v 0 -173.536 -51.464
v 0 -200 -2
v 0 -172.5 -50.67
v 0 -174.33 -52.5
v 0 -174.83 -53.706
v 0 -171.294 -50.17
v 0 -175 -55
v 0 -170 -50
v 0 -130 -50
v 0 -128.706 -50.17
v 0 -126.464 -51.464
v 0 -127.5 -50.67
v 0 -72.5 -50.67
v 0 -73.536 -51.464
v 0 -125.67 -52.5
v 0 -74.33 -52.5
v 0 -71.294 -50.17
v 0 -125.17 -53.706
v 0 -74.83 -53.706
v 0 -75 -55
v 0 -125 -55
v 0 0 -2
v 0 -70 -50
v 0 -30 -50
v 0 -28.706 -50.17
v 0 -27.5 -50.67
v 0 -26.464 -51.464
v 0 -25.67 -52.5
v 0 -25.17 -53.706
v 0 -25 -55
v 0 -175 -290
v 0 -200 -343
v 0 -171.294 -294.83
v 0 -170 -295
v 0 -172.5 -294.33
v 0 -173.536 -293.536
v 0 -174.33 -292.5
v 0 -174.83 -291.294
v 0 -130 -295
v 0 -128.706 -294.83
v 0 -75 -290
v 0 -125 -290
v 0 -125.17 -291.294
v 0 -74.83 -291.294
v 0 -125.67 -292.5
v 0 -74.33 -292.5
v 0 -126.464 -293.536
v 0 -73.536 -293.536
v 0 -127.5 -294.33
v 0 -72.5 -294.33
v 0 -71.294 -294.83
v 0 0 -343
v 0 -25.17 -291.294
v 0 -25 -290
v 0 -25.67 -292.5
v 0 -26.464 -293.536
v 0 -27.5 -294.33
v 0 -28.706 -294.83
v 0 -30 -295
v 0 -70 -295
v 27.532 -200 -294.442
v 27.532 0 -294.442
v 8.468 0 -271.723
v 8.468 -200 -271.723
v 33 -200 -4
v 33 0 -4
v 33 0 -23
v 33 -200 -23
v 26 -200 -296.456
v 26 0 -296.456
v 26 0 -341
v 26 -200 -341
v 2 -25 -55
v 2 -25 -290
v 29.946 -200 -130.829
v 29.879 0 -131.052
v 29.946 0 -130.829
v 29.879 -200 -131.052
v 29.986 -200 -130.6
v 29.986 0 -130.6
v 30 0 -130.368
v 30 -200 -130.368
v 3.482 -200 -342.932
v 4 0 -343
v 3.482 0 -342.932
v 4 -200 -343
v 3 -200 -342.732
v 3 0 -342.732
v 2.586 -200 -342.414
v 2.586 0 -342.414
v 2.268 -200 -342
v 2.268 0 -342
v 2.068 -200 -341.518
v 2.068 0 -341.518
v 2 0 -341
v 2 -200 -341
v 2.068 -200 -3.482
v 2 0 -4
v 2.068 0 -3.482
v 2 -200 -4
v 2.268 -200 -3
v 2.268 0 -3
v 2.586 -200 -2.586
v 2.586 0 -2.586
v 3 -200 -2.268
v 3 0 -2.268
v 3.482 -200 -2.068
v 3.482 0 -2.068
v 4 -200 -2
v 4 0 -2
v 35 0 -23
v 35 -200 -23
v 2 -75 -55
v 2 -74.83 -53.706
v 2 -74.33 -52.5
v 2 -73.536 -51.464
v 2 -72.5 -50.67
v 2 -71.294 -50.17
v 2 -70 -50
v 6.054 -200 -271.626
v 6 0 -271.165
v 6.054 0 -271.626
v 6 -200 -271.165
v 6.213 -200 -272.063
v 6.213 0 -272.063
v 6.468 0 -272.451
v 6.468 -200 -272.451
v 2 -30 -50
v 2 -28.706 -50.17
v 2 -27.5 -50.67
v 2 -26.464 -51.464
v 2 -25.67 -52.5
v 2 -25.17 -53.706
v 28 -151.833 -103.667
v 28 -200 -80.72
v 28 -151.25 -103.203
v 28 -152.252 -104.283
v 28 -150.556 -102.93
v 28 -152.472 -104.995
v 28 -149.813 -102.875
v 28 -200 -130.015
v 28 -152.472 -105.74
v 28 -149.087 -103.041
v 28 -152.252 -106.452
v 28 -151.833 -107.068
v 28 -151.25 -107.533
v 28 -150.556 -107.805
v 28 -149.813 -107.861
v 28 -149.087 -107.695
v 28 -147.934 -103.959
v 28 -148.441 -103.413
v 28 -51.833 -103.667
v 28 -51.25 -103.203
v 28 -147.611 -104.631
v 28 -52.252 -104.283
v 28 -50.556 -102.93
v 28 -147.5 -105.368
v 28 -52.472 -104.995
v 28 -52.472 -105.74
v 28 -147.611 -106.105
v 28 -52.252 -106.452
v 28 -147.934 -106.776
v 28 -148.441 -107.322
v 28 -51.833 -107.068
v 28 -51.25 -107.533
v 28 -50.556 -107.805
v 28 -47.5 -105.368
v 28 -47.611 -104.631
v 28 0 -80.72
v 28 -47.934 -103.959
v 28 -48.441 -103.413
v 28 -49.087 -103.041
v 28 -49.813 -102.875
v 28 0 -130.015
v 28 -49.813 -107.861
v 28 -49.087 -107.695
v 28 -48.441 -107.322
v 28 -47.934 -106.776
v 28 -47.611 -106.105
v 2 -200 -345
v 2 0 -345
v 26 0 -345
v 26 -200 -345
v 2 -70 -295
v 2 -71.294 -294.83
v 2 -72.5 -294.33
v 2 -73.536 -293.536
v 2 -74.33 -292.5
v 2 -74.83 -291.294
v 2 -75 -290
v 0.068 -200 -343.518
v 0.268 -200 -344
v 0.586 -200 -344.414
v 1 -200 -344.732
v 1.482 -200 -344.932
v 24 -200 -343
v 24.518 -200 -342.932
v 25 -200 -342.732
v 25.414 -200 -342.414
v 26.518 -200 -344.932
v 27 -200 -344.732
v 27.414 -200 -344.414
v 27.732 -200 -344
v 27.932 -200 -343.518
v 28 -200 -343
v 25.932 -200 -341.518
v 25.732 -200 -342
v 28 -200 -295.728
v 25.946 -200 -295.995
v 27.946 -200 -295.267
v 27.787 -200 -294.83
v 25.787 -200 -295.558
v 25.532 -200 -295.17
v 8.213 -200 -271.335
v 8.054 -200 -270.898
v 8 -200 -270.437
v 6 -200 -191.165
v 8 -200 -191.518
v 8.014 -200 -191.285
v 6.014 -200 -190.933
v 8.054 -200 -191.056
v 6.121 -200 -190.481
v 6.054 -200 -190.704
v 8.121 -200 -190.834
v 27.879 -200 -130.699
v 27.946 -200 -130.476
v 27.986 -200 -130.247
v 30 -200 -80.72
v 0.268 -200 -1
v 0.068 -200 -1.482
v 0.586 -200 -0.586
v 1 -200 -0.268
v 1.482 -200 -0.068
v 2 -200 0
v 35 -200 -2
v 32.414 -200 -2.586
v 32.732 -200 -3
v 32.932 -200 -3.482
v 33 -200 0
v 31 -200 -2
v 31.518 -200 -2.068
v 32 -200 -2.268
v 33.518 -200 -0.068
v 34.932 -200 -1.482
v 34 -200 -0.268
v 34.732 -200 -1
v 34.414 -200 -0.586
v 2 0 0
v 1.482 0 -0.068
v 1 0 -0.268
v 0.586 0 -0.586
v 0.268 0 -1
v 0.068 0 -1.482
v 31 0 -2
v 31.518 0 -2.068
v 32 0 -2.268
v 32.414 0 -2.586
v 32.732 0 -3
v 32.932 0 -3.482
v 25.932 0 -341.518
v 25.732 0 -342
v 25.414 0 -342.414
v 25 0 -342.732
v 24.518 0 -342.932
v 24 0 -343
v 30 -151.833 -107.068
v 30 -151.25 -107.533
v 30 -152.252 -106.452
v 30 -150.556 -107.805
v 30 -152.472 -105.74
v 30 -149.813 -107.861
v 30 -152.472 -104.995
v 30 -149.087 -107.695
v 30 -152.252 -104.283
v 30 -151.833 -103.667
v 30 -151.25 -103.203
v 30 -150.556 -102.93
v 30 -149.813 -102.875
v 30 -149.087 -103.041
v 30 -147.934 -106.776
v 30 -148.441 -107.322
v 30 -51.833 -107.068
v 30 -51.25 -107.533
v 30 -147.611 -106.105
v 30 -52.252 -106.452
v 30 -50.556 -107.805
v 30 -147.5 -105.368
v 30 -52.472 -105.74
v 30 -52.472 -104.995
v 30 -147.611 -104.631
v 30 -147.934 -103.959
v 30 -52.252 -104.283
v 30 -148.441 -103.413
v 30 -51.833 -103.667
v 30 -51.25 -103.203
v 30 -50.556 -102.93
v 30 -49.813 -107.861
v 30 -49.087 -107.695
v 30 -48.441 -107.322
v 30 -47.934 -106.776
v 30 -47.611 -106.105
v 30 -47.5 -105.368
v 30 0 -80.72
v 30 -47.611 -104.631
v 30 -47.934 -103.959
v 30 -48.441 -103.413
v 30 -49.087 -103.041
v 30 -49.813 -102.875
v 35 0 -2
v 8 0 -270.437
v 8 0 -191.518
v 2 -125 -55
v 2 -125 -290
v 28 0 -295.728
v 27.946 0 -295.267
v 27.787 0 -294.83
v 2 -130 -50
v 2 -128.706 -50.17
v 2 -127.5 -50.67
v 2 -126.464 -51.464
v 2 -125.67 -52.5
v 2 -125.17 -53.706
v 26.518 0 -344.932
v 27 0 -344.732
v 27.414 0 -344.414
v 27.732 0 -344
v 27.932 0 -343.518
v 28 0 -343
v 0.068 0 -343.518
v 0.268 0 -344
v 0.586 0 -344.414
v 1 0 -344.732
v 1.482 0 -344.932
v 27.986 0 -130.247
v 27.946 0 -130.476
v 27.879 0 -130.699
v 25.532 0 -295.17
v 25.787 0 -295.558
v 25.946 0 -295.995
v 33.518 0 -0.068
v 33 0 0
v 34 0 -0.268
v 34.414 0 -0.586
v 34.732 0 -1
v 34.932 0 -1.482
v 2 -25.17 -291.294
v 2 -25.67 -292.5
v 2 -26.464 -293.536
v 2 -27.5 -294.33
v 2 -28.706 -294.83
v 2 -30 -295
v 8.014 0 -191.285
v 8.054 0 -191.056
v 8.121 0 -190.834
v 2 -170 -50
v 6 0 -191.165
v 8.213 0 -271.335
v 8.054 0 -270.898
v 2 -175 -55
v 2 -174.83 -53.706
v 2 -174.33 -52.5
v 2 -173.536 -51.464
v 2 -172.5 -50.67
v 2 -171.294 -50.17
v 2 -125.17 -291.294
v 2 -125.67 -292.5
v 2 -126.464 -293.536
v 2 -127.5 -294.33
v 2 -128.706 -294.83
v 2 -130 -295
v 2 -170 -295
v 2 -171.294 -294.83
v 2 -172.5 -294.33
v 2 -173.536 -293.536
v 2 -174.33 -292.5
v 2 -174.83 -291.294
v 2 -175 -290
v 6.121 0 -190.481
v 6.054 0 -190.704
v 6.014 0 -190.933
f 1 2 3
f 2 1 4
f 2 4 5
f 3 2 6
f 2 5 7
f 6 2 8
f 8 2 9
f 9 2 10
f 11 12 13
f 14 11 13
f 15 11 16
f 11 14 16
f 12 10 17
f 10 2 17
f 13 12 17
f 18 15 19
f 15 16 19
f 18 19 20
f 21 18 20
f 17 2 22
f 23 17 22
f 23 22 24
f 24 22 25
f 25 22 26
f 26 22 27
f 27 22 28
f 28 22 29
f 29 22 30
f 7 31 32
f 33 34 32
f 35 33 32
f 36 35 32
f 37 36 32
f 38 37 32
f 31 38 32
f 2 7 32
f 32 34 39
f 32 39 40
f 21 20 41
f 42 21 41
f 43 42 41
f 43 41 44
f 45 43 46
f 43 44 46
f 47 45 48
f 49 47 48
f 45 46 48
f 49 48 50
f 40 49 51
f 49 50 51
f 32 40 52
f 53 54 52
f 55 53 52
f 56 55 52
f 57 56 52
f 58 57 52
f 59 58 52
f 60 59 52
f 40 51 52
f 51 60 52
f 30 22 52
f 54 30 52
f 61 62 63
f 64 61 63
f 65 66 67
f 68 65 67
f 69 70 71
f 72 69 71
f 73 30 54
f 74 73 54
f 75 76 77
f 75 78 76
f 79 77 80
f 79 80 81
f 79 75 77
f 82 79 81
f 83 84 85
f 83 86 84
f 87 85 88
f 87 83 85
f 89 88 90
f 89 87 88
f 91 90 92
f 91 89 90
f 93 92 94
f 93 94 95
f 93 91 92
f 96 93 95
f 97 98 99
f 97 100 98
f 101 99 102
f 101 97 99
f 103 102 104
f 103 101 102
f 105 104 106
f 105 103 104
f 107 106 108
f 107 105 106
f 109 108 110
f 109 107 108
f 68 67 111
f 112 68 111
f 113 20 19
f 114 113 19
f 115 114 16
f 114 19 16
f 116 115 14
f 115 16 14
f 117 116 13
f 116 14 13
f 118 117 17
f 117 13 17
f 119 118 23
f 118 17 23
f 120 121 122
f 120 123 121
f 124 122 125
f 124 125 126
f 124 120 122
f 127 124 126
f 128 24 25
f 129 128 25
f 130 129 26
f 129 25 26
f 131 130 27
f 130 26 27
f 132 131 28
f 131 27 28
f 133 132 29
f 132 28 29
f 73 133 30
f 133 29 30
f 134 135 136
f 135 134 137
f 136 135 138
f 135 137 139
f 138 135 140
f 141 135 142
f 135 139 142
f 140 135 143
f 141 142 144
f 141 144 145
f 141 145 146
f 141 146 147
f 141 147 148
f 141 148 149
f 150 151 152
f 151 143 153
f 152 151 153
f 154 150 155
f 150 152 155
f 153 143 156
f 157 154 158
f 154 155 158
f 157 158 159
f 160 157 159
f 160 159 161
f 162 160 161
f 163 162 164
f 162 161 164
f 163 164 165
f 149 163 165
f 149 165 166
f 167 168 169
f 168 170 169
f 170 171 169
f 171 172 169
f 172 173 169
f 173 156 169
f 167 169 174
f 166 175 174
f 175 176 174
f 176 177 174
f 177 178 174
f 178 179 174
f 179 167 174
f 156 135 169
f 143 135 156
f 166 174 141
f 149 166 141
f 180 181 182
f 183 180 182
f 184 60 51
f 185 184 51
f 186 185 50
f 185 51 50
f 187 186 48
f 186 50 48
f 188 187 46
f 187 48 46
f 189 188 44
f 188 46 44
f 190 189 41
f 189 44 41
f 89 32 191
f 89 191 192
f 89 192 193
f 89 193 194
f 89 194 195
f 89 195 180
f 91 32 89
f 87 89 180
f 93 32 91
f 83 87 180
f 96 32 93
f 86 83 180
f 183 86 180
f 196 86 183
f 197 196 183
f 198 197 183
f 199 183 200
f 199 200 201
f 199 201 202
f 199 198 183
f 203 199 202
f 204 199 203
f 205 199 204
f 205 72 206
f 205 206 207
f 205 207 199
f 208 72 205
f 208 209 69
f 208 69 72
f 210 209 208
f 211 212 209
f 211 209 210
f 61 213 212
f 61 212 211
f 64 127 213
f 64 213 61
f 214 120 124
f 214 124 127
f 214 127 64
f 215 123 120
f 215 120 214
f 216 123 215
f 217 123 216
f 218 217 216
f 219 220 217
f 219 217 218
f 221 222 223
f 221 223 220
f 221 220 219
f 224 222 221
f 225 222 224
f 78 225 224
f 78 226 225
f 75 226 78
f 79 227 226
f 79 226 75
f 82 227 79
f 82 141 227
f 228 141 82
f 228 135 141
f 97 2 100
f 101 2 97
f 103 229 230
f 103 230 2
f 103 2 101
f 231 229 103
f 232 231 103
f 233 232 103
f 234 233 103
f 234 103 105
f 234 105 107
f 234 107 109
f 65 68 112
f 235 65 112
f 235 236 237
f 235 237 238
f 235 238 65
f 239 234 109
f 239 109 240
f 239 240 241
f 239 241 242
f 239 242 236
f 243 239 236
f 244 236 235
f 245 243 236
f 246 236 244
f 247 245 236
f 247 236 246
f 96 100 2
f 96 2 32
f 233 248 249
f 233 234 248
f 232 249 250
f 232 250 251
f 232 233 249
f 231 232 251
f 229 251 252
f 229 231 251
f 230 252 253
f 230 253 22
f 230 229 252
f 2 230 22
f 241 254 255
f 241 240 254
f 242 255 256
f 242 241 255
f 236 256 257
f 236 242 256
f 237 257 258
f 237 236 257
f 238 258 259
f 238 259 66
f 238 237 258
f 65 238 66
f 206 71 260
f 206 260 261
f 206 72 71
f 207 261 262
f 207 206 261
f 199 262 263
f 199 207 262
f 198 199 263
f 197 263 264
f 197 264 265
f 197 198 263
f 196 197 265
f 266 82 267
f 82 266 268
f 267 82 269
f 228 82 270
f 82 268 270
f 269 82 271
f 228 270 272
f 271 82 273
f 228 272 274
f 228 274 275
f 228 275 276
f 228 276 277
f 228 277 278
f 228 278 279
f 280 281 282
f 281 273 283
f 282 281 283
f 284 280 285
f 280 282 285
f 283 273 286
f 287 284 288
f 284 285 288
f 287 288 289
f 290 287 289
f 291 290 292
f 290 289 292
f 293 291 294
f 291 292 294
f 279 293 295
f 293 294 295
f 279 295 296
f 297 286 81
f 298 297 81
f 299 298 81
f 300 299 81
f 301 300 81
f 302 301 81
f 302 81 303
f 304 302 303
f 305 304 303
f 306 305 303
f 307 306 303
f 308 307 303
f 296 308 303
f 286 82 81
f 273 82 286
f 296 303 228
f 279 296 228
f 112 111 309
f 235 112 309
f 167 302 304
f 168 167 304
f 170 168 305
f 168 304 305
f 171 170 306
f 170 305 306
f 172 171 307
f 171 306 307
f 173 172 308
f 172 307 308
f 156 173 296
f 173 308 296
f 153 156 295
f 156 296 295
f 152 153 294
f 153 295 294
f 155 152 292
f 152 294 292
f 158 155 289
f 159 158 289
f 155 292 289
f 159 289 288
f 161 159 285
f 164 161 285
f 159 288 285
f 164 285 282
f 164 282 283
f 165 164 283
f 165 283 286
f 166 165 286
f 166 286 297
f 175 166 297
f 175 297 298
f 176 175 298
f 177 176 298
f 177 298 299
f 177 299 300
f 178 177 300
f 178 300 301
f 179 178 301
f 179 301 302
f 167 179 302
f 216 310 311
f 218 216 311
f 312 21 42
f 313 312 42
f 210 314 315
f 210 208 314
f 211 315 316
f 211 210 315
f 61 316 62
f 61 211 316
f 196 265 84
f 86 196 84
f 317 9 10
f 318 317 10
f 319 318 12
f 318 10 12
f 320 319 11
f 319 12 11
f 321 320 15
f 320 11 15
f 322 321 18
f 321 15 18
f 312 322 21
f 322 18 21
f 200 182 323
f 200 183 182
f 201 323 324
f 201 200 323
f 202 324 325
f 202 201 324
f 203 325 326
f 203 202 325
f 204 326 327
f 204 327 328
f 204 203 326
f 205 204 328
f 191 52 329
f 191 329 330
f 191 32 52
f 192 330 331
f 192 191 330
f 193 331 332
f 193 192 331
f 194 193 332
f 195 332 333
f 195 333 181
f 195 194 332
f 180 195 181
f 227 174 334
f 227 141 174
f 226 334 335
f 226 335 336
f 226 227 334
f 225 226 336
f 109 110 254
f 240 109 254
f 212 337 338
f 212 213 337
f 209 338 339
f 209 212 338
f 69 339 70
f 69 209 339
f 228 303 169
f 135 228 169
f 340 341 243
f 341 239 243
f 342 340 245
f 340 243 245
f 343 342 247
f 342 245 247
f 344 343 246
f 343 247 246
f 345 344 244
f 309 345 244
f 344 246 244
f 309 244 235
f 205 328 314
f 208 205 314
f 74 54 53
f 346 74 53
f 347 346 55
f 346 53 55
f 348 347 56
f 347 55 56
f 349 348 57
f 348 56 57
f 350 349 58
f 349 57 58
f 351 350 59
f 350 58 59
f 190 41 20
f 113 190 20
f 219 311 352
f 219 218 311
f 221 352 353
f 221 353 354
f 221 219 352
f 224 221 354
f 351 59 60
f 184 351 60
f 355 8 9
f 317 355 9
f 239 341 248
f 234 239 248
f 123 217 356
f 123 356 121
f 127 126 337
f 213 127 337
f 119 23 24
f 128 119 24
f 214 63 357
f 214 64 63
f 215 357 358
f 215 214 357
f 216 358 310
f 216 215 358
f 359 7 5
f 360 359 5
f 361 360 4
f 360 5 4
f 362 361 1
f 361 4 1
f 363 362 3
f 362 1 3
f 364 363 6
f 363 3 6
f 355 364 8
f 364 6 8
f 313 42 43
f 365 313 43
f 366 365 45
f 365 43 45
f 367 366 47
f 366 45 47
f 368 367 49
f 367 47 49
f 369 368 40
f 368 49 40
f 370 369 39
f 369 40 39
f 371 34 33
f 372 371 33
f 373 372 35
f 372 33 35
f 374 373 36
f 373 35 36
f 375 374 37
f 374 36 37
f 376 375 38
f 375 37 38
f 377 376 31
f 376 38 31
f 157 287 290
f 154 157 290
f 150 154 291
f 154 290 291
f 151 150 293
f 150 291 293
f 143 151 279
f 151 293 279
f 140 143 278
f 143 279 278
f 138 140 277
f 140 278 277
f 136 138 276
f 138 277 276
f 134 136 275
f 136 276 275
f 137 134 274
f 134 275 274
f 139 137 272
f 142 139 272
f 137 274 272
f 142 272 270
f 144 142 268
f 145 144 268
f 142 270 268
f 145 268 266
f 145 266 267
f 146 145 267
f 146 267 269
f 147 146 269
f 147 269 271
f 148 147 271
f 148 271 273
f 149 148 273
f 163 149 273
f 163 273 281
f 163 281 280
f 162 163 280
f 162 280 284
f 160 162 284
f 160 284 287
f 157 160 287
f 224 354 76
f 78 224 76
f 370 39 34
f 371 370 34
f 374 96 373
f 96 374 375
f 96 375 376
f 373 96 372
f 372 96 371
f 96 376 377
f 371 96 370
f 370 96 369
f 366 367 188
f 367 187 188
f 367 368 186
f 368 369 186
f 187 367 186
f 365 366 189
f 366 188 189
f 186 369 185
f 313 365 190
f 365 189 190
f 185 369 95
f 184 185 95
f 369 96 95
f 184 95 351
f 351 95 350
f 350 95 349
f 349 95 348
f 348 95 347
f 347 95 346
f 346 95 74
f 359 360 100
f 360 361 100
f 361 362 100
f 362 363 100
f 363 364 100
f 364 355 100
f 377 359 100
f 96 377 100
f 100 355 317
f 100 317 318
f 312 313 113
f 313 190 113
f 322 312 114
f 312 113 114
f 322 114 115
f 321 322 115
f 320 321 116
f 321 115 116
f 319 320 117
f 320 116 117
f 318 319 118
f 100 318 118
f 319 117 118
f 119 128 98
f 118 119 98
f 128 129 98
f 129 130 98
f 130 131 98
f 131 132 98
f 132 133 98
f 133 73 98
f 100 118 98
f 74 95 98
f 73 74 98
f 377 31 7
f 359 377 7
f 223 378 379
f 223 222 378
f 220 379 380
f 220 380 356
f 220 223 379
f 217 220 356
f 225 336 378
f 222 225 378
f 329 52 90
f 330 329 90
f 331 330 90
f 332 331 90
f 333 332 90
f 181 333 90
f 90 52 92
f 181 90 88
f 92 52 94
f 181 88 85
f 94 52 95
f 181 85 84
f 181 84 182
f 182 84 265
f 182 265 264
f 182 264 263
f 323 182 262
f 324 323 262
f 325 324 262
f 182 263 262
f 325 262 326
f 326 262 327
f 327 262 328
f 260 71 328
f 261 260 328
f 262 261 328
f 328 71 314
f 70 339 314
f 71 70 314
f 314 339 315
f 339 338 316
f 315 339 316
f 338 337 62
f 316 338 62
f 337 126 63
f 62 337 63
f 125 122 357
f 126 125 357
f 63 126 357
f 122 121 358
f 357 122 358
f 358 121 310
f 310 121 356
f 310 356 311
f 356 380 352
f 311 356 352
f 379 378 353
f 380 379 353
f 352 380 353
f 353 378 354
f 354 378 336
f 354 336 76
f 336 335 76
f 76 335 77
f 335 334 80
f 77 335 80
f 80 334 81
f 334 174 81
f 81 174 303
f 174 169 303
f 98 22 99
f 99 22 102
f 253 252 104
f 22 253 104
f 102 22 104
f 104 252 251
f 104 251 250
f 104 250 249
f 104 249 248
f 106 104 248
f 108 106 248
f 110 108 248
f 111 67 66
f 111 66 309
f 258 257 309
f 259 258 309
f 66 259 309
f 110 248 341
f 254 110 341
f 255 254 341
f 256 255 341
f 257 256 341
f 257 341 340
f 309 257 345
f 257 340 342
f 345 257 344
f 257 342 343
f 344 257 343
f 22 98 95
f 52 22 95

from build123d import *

# Parameters (mm, degrees)
F1_DEPTH = 200
F2_R     = 2
F4_DEPTH = 2
F6_D     = 5
F6_DEPTH = 2


with BuildPart() as f1:
    # F0 (on Front) → F1 (new body)
    with BuildSketch(Plane.XZ):
        Polygon((35, 0), (0, 0), (0, -345), (28, -345), (28, -295), (8, -271.164928), (8, -191.164928), (30, -130.720425), (30, -80.720425), (28, -80.720425), (28, -130.367771), (6, -190.812274), (6, -271.892869), (26, -295.72794), (26, -343), (2, -343), (2, -2), (33, -2), (33, -23), (35, -23), align=None)
    extrude(amount=F1_DEPTH)

    # F2
    f2_edges = [f1.edges().sort_by_distance(p)[0] for p in [
        (0, -100, 0),
        (35, -100, 0),
        (33, -100, -2),
        (2, -100, -2),
        (0, -100, -345),
        (2, -100, -343),
        (28, -100, -345),
        (26, -100, -343),
        (26, -100, -295.72794),
        (28, -100, -295),
        (8, -100, -271.164928),
        (6, -100, -271.892869),
        (6, -100, -190.812274),
        (8, -100, -191.164928),
        (30, -100, -130.720425),
        (28, -100, -130.367771),
    ]]
    fillet(f2_edges, radius=F2_R)

    # F3 (on face) → F4 (cut)
    with BuildSketch(Plane(origin=(0, 0, 0), x_dir=(0, -1, 0), z_dir=(-1, 0, 0))):
        with BuildLine():
            Line((70, -50), (30, -50))
            ThreePointArc((30, -50), (26.464466, -51.464466), (25, -55))
            Line((25, -55), (25, -290))
            ThreePointArc((25, -290), (26.464466, -293.535534), (30, -295))
            Line((30, -295), (70, -295))
            ThreePointArc((70, -295), (73.535534, -293.535534), (75, -290))
            Line((75, -290), (75, -55))
            ThreePointArc((75, -55), (73.535534, -51.464466), (70, -50))
        make_face()
        with BuildLine():
            ThreePointArc((175, -55), (173.535534, -51.464466), (170, -50))
            Line((170, -50), (130, -50))
            ThreePointArc((130, -50), (126.464466, -51.464466), (125, -55))
            Line((125, -55), (125, -290))
            ThreePointArc((125, -290), (126.464466, -293.535534), (130, -295))
            Line((130, -295), (170, -295))
            ThreePointArc((170, -295), (173.535534, -293.535534), (175, -290))
            Line((175, -290), (175, -55))
        make_face()
    extrude(amount=-F4_DEPTH, mode=Mode.SUBTRACT)

    # F6
    with Locations(Plane(origin=(28, 0, 0), x_dir=(0, -1, 0), z_dir=(-1, 0, 0))):
        with Locations((50, -105.367771), (150, -105.367771)):
            Hole(F6_D / 2, depth=F6_DEPTH)


solid = f1.part
